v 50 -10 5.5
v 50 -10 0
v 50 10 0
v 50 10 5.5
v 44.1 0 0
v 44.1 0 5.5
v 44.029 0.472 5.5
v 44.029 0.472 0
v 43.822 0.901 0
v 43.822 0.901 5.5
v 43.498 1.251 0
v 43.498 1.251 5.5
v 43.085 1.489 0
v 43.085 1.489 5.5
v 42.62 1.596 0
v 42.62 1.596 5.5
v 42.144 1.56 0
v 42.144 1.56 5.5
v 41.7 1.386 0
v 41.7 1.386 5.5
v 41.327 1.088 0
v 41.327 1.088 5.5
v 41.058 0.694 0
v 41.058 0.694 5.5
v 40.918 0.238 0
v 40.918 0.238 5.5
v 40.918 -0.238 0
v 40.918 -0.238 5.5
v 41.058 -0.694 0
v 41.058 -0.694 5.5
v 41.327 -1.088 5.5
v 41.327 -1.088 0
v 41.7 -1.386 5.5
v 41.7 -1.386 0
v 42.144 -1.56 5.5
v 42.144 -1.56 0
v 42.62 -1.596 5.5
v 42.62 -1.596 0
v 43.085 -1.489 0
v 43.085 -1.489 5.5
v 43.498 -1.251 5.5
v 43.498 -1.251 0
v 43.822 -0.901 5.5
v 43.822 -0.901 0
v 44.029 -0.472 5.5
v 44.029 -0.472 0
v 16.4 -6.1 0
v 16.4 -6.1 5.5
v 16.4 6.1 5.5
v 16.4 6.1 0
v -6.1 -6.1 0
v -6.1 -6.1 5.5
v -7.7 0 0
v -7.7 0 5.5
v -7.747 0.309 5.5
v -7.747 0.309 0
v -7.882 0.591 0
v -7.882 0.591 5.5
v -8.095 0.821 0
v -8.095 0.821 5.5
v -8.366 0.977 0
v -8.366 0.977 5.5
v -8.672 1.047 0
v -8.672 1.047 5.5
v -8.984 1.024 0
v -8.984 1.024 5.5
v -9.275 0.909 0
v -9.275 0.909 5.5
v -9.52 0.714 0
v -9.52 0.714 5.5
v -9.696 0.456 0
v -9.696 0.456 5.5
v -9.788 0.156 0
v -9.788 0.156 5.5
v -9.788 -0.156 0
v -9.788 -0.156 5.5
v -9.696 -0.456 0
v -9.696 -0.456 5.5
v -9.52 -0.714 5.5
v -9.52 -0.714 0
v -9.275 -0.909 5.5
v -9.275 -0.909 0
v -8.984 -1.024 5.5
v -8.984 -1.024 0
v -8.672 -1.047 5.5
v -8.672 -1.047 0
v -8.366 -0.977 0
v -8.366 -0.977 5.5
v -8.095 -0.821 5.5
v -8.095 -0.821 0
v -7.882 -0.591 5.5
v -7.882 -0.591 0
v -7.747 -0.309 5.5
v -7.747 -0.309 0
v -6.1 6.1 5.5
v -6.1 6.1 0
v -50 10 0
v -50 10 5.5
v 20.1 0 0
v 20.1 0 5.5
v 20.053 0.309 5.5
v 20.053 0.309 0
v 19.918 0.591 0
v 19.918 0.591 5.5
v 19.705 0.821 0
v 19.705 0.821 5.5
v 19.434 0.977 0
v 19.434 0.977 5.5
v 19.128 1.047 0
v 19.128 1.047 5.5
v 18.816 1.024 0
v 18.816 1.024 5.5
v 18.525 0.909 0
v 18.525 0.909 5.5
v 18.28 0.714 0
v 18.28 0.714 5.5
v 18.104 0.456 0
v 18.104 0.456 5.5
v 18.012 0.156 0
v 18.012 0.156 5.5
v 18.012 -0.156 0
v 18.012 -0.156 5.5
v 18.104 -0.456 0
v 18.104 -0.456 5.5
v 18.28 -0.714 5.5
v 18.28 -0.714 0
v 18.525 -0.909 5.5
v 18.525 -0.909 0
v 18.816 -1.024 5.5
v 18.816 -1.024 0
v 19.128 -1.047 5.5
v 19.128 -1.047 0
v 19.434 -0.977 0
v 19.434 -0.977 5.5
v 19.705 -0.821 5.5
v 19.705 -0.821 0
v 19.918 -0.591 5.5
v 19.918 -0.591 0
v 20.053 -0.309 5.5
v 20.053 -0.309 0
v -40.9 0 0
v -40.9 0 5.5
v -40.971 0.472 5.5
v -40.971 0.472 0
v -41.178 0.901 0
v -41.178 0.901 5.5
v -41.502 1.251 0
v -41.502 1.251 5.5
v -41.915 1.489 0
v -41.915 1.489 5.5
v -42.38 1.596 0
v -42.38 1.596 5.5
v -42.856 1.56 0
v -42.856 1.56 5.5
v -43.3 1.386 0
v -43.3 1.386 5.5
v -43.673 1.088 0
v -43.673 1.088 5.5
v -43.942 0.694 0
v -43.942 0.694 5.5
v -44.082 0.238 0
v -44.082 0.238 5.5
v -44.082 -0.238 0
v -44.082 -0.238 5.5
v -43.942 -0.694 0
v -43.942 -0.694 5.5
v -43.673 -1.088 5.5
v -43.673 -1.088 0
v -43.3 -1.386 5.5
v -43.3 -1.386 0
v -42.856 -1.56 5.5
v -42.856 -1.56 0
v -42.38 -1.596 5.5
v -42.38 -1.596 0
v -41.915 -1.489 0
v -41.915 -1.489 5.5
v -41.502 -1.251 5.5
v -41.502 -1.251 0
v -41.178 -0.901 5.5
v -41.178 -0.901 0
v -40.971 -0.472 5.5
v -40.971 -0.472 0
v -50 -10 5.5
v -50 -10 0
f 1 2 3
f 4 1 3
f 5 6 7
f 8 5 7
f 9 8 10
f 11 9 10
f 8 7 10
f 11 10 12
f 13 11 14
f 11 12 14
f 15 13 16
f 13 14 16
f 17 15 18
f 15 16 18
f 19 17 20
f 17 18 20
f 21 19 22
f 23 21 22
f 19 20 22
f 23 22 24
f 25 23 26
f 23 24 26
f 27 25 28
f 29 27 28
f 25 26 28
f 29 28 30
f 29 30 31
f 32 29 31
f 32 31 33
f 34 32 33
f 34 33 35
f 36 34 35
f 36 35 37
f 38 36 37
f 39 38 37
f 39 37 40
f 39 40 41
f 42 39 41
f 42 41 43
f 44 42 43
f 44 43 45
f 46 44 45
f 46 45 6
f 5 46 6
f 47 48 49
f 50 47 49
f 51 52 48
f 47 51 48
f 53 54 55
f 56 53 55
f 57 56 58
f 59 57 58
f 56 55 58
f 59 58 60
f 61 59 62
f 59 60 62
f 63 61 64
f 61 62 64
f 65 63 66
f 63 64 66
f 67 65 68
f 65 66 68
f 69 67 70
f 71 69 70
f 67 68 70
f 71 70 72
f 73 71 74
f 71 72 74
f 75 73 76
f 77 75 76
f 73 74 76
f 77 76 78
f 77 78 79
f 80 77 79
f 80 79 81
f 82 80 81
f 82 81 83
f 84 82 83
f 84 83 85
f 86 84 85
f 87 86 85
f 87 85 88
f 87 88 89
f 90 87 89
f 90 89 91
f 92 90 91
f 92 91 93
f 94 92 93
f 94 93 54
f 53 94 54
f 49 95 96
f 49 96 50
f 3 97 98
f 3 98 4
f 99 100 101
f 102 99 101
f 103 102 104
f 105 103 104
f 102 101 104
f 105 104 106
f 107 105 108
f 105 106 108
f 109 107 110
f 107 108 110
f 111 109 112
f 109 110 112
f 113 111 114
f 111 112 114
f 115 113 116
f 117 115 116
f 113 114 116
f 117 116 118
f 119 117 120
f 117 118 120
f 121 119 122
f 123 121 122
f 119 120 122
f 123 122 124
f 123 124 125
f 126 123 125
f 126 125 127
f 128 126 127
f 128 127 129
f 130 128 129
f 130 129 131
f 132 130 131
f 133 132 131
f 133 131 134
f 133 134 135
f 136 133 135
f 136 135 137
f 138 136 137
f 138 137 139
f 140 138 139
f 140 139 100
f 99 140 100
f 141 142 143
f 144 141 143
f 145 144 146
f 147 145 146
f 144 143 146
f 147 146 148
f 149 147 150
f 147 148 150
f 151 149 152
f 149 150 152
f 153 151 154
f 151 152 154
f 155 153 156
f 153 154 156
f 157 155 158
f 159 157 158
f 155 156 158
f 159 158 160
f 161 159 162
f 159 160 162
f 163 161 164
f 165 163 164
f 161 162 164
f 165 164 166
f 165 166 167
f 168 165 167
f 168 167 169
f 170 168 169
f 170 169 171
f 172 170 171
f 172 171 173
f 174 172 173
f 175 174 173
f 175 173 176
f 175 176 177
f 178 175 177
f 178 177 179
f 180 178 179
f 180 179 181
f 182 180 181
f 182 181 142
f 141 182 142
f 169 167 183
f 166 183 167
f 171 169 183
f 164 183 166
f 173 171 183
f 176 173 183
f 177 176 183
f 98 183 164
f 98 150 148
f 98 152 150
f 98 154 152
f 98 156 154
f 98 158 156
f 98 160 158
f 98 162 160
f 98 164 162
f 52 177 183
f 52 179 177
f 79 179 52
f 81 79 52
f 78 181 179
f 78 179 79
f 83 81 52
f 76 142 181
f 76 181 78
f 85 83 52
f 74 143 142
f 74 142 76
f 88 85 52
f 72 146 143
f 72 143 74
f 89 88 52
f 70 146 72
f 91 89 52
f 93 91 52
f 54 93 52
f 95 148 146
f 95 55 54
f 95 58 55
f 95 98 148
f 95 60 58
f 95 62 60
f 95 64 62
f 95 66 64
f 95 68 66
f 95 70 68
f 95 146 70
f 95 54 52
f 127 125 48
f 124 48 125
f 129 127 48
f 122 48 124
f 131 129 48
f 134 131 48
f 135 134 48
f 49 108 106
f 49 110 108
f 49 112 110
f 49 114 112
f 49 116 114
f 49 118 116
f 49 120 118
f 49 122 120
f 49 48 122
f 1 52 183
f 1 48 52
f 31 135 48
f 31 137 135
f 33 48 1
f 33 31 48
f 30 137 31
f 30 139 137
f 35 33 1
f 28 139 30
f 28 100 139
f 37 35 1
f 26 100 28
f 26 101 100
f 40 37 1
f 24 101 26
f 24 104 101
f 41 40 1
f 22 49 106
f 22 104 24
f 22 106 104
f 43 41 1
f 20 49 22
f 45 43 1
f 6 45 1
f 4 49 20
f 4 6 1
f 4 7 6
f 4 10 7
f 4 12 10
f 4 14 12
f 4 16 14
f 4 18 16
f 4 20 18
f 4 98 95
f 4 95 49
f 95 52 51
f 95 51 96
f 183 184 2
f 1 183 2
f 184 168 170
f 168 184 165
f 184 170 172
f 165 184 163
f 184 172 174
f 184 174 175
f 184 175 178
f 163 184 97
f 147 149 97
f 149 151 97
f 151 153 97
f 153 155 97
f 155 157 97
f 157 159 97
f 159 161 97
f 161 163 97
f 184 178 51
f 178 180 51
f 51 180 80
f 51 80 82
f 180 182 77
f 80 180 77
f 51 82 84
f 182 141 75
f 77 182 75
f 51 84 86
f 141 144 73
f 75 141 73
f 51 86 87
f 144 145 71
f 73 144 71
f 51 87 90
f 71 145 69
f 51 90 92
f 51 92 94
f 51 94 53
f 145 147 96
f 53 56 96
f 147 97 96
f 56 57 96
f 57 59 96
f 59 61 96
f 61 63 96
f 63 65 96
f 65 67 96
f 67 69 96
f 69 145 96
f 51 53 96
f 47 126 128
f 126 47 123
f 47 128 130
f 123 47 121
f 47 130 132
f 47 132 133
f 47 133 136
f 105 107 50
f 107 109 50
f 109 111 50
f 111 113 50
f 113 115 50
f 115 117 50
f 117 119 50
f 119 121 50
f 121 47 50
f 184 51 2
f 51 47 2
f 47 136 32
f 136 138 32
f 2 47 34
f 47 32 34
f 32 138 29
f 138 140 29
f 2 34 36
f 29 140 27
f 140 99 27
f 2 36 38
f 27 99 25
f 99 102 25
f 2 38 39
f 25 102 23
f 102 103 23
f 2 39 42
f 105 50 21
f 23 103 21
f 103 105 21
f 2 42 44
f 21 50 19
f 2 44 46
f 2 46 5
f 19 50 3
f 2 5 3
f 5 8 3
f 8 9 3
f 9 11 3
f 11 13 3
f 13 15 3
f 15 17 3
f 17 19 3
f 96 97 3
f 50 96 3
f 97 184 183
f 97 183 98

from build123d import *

# Parameters (mm, degrees)
SKETCH_1_W          = 100
SKETCH_1_H          = 20
EXTRUDE_1_DEPTH     = 5.5
SKETCH_2_R          = 1.6
SKETCH_2_R_2        = 1.05
SKETCH_2_W          = 22.5
SKETCH_2_H          = 12.2
CUT_EXTRUDE_1_DEPTH = 52.285962992


with BuildPart() as part:
    # ｽｹｯﾁ1 → ﾎﾞｽ - 押し出し1 (new body)
    with BuildSketch(Plane.XY):
        Rectangle(SKETCH_1_W, SKETCH_1_H)
    extrude(amount=EXTRUDE_1_DEPTH)

    # ｽｹｯﾁ2 → ｶｯﾄ - 押し出し1 (cut, through all)
    with BuildSketch(Plane.XY.offset(5.5)):
        with Locations((-42.5, 0)):
            Circle(SKETCH_2_R)
        with Locations((42.5, 0)):
            Circle(SKETCH_2_R)
        with Locations((-8.75, 0)):
            Circle(SKETCH_2_R_2)
        with Locations((19.05, 0)):
            Circle(SKETCH_2_R_2)
        with Locations((5.15, 0)):
            Rectangle(SKETCH_2_W, SKETCH_2_H)
    extrude(amount=-CUT_EXTRUDE_1_DEPTH, mode=Mode.SUBTRACT)


solid = part.part
